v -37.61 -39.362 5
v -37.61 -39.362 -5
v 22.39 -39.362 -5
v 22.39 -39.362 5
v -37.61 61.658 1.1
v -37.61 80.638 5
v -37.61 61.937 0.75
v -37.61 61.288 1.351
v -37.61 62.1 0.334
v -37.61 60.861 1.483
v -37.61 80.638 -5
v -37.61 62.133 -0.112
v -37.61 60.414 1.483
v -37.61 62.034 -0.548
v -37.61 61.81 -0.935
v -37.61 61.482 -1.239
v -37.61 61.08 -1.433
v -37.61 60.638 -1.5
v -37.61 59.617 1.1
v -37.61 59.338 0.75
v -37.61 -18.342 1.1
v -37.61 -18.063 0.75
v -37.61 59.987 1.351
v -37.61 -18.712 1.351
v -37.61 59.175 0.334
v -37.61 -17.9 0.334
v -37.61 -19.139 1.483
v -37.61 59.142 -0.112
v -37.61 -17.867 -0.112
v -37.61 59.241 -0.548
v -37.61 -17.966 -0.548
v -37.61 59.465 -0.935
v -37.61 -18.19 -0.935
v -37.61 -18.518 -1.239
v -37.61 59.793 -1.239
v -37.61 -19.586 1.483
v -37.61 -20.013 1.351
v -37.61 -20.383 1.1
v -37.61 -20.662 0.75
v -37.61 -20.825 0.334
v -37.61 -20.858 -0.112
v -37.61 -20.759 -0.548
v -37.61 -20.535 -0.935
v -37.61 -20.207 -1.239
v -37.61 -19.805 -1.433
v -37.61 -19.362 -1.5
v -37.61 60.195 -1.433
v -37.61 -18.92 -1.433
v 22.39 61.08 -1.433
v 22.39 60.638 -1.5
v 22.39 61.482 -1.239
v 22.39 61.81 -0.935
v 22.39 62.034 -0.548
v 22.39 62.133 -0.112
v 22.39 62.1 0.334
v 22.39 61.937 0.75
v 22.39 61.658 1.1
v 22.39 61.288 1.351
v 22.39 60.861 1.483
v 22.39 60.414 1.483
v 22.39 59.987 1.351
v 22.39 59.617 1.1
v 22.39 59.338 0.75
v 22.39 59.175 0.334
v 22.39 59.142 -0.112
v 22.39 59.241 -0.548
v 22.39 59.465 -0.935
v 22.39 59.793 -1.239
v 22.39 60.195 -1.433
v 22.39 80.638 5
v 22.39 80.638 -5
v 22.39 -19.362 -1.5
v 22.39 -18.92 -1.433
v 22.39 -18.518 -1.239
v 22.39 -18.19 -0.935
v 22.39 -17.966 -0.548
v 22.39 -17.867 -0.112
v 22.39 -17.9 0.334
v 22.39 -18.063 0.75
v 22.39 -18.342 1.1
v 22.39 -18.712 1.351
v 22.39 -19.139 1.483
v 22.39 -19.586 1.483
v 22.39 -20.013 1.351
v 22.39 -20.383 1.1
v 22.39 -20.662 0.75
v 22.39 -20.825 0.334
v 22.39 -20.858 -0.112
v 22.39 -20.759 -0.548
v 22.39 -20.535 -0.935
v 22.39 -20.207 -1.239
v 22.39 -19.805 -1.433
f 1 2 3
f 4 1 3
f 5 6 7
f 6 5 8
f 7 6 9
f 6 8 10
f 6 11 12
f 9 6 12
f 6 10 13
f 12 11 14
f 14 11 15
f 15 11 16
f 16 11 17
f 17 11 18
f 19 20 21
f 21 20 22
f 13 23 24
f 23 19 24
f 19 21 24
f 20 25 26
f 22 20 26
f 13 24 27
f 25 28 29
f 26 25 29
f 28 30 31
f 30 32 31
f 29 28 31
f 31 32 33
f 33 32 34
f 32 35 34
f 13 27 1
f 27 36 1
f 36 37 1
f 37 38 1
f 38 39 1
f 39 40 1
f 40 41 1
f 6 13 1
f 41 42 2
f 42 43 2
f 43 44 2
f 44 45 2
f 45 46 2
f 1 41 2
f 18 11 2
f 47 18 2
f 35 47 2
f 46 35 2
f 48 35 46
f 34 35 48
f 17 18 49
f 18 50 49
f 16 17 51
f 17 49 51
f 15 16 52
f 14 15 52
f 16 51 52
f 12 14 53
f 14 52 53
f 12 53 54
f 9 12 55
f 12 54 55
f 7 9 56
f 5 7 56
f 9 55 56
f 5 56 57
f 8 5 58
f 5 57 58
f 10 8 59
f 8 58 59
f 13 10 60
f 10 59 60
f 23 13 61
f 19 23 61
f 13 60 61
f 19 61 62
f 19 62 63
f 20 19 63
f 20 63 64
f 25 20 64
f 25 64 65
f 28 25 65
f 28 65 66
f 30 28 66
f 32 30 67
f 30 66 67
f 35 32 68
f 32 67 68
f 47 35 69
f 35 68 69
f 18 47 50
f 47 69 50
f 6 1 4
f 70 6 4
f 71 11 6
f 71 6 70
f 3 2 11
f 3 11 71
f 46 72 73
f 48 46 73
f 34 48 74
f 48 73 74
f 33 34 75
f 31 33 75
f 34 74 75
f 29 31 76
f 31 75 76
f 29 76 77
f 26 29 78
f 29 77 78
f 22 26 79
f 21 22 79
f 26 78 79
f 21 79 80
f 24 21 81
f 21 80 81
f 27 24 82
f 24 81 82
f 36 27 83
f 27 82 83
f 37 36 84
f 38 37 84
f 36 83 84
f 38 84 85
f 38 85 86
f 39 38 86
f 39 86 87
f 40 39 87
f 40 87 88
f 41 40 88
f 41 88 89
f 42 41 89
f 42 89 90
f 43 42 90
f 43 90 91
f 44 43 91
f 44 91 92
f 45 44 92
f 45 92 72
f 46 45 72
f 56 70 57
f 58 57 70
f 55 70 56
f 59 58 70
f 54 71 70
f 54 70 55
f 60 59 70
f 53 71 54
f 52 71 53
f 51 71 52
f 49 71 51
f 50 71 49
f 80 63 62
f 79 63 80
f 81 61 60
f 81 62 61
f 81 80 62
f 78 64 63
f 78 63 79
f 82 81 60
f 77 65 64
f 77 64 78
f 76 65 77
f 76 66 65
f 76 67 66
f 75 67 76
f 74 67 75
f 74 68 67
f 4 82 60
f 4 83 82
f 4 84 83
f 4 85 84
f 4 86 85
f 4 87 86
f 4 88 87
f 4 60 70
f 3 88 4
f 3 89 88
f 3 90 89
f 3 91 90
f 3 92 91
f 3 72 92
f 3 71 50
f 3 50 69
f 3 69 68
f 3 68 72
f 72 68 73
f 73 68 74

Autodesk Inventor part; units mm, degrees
ref_plane "YZ Plane" through (0, 0, 0) normal (1, 0, 0) x (0, 1, 0)
ref_plane "XZ Plane" through (0, 0, 0) normal (0, 1, 0) x (-1, 0, 0)
ref_plane "XY Plane" through (0, 0, 0) normal (0, 0, 1) x (1, 0, 0)
sketch "Esquisse1" plane through (0, 0, 0) normal (0, 0, 1) x (1, 0, 0)
  line L0 (22.3904, 80.6375) -> (22.3904, -39.3625)
  line L1 (-37.6096, 80.6375) -> (-37.6096, -39.3625)
  line L2 (-37.6096, -39.3625) -> (22.3904, -39.3625)
  line L3 (-37.6096, 80.6375) -> (22.3904, 80.6375)
  point P0 (0, 0)
  dimension "d0" = 120
  dimension "d1" = 60
extrude "Extrusion1" add sketch "Esquisse1" along normal mid plane 10
sketch "Esquisse2" plane through (22.3904, -39.3625, 5) normal (1, 0, 0) x (0, 0, -1)
  circle A0 centre (5, 100) radius 1.5
  line L0 (10, 0) -> (0, 0) projected
  point P0 (5, 39.3625)
  point P1 (5, 0)
  dimension "d10" = 100
  dimension "d11" = 3
sketch "Esquisse3" plane through (22.3904, -39.3625, 5) normal (1, 0, 0) x (0, 0, -1)
  circle A0 centre (5, 20) radius 1.5
  line L0 (10, 0) -> (0, 0) projected
  circle A1 centre (5, 100) radius 1.5
  point P0 (5, 39.3625)
  point P1 (5, 0)
  dimension "d4" = 20
  dimension "d5" = 3
  dimension "d6" = 100
  dimension "d7" = 3
extrude "Extrusion2" cut sketch "Esquisse3" against normal through all contours A0
extrude "Extrusion3" cut sketch "Esquisse2" against normal blind 60
properties part number "plaque de separation"
